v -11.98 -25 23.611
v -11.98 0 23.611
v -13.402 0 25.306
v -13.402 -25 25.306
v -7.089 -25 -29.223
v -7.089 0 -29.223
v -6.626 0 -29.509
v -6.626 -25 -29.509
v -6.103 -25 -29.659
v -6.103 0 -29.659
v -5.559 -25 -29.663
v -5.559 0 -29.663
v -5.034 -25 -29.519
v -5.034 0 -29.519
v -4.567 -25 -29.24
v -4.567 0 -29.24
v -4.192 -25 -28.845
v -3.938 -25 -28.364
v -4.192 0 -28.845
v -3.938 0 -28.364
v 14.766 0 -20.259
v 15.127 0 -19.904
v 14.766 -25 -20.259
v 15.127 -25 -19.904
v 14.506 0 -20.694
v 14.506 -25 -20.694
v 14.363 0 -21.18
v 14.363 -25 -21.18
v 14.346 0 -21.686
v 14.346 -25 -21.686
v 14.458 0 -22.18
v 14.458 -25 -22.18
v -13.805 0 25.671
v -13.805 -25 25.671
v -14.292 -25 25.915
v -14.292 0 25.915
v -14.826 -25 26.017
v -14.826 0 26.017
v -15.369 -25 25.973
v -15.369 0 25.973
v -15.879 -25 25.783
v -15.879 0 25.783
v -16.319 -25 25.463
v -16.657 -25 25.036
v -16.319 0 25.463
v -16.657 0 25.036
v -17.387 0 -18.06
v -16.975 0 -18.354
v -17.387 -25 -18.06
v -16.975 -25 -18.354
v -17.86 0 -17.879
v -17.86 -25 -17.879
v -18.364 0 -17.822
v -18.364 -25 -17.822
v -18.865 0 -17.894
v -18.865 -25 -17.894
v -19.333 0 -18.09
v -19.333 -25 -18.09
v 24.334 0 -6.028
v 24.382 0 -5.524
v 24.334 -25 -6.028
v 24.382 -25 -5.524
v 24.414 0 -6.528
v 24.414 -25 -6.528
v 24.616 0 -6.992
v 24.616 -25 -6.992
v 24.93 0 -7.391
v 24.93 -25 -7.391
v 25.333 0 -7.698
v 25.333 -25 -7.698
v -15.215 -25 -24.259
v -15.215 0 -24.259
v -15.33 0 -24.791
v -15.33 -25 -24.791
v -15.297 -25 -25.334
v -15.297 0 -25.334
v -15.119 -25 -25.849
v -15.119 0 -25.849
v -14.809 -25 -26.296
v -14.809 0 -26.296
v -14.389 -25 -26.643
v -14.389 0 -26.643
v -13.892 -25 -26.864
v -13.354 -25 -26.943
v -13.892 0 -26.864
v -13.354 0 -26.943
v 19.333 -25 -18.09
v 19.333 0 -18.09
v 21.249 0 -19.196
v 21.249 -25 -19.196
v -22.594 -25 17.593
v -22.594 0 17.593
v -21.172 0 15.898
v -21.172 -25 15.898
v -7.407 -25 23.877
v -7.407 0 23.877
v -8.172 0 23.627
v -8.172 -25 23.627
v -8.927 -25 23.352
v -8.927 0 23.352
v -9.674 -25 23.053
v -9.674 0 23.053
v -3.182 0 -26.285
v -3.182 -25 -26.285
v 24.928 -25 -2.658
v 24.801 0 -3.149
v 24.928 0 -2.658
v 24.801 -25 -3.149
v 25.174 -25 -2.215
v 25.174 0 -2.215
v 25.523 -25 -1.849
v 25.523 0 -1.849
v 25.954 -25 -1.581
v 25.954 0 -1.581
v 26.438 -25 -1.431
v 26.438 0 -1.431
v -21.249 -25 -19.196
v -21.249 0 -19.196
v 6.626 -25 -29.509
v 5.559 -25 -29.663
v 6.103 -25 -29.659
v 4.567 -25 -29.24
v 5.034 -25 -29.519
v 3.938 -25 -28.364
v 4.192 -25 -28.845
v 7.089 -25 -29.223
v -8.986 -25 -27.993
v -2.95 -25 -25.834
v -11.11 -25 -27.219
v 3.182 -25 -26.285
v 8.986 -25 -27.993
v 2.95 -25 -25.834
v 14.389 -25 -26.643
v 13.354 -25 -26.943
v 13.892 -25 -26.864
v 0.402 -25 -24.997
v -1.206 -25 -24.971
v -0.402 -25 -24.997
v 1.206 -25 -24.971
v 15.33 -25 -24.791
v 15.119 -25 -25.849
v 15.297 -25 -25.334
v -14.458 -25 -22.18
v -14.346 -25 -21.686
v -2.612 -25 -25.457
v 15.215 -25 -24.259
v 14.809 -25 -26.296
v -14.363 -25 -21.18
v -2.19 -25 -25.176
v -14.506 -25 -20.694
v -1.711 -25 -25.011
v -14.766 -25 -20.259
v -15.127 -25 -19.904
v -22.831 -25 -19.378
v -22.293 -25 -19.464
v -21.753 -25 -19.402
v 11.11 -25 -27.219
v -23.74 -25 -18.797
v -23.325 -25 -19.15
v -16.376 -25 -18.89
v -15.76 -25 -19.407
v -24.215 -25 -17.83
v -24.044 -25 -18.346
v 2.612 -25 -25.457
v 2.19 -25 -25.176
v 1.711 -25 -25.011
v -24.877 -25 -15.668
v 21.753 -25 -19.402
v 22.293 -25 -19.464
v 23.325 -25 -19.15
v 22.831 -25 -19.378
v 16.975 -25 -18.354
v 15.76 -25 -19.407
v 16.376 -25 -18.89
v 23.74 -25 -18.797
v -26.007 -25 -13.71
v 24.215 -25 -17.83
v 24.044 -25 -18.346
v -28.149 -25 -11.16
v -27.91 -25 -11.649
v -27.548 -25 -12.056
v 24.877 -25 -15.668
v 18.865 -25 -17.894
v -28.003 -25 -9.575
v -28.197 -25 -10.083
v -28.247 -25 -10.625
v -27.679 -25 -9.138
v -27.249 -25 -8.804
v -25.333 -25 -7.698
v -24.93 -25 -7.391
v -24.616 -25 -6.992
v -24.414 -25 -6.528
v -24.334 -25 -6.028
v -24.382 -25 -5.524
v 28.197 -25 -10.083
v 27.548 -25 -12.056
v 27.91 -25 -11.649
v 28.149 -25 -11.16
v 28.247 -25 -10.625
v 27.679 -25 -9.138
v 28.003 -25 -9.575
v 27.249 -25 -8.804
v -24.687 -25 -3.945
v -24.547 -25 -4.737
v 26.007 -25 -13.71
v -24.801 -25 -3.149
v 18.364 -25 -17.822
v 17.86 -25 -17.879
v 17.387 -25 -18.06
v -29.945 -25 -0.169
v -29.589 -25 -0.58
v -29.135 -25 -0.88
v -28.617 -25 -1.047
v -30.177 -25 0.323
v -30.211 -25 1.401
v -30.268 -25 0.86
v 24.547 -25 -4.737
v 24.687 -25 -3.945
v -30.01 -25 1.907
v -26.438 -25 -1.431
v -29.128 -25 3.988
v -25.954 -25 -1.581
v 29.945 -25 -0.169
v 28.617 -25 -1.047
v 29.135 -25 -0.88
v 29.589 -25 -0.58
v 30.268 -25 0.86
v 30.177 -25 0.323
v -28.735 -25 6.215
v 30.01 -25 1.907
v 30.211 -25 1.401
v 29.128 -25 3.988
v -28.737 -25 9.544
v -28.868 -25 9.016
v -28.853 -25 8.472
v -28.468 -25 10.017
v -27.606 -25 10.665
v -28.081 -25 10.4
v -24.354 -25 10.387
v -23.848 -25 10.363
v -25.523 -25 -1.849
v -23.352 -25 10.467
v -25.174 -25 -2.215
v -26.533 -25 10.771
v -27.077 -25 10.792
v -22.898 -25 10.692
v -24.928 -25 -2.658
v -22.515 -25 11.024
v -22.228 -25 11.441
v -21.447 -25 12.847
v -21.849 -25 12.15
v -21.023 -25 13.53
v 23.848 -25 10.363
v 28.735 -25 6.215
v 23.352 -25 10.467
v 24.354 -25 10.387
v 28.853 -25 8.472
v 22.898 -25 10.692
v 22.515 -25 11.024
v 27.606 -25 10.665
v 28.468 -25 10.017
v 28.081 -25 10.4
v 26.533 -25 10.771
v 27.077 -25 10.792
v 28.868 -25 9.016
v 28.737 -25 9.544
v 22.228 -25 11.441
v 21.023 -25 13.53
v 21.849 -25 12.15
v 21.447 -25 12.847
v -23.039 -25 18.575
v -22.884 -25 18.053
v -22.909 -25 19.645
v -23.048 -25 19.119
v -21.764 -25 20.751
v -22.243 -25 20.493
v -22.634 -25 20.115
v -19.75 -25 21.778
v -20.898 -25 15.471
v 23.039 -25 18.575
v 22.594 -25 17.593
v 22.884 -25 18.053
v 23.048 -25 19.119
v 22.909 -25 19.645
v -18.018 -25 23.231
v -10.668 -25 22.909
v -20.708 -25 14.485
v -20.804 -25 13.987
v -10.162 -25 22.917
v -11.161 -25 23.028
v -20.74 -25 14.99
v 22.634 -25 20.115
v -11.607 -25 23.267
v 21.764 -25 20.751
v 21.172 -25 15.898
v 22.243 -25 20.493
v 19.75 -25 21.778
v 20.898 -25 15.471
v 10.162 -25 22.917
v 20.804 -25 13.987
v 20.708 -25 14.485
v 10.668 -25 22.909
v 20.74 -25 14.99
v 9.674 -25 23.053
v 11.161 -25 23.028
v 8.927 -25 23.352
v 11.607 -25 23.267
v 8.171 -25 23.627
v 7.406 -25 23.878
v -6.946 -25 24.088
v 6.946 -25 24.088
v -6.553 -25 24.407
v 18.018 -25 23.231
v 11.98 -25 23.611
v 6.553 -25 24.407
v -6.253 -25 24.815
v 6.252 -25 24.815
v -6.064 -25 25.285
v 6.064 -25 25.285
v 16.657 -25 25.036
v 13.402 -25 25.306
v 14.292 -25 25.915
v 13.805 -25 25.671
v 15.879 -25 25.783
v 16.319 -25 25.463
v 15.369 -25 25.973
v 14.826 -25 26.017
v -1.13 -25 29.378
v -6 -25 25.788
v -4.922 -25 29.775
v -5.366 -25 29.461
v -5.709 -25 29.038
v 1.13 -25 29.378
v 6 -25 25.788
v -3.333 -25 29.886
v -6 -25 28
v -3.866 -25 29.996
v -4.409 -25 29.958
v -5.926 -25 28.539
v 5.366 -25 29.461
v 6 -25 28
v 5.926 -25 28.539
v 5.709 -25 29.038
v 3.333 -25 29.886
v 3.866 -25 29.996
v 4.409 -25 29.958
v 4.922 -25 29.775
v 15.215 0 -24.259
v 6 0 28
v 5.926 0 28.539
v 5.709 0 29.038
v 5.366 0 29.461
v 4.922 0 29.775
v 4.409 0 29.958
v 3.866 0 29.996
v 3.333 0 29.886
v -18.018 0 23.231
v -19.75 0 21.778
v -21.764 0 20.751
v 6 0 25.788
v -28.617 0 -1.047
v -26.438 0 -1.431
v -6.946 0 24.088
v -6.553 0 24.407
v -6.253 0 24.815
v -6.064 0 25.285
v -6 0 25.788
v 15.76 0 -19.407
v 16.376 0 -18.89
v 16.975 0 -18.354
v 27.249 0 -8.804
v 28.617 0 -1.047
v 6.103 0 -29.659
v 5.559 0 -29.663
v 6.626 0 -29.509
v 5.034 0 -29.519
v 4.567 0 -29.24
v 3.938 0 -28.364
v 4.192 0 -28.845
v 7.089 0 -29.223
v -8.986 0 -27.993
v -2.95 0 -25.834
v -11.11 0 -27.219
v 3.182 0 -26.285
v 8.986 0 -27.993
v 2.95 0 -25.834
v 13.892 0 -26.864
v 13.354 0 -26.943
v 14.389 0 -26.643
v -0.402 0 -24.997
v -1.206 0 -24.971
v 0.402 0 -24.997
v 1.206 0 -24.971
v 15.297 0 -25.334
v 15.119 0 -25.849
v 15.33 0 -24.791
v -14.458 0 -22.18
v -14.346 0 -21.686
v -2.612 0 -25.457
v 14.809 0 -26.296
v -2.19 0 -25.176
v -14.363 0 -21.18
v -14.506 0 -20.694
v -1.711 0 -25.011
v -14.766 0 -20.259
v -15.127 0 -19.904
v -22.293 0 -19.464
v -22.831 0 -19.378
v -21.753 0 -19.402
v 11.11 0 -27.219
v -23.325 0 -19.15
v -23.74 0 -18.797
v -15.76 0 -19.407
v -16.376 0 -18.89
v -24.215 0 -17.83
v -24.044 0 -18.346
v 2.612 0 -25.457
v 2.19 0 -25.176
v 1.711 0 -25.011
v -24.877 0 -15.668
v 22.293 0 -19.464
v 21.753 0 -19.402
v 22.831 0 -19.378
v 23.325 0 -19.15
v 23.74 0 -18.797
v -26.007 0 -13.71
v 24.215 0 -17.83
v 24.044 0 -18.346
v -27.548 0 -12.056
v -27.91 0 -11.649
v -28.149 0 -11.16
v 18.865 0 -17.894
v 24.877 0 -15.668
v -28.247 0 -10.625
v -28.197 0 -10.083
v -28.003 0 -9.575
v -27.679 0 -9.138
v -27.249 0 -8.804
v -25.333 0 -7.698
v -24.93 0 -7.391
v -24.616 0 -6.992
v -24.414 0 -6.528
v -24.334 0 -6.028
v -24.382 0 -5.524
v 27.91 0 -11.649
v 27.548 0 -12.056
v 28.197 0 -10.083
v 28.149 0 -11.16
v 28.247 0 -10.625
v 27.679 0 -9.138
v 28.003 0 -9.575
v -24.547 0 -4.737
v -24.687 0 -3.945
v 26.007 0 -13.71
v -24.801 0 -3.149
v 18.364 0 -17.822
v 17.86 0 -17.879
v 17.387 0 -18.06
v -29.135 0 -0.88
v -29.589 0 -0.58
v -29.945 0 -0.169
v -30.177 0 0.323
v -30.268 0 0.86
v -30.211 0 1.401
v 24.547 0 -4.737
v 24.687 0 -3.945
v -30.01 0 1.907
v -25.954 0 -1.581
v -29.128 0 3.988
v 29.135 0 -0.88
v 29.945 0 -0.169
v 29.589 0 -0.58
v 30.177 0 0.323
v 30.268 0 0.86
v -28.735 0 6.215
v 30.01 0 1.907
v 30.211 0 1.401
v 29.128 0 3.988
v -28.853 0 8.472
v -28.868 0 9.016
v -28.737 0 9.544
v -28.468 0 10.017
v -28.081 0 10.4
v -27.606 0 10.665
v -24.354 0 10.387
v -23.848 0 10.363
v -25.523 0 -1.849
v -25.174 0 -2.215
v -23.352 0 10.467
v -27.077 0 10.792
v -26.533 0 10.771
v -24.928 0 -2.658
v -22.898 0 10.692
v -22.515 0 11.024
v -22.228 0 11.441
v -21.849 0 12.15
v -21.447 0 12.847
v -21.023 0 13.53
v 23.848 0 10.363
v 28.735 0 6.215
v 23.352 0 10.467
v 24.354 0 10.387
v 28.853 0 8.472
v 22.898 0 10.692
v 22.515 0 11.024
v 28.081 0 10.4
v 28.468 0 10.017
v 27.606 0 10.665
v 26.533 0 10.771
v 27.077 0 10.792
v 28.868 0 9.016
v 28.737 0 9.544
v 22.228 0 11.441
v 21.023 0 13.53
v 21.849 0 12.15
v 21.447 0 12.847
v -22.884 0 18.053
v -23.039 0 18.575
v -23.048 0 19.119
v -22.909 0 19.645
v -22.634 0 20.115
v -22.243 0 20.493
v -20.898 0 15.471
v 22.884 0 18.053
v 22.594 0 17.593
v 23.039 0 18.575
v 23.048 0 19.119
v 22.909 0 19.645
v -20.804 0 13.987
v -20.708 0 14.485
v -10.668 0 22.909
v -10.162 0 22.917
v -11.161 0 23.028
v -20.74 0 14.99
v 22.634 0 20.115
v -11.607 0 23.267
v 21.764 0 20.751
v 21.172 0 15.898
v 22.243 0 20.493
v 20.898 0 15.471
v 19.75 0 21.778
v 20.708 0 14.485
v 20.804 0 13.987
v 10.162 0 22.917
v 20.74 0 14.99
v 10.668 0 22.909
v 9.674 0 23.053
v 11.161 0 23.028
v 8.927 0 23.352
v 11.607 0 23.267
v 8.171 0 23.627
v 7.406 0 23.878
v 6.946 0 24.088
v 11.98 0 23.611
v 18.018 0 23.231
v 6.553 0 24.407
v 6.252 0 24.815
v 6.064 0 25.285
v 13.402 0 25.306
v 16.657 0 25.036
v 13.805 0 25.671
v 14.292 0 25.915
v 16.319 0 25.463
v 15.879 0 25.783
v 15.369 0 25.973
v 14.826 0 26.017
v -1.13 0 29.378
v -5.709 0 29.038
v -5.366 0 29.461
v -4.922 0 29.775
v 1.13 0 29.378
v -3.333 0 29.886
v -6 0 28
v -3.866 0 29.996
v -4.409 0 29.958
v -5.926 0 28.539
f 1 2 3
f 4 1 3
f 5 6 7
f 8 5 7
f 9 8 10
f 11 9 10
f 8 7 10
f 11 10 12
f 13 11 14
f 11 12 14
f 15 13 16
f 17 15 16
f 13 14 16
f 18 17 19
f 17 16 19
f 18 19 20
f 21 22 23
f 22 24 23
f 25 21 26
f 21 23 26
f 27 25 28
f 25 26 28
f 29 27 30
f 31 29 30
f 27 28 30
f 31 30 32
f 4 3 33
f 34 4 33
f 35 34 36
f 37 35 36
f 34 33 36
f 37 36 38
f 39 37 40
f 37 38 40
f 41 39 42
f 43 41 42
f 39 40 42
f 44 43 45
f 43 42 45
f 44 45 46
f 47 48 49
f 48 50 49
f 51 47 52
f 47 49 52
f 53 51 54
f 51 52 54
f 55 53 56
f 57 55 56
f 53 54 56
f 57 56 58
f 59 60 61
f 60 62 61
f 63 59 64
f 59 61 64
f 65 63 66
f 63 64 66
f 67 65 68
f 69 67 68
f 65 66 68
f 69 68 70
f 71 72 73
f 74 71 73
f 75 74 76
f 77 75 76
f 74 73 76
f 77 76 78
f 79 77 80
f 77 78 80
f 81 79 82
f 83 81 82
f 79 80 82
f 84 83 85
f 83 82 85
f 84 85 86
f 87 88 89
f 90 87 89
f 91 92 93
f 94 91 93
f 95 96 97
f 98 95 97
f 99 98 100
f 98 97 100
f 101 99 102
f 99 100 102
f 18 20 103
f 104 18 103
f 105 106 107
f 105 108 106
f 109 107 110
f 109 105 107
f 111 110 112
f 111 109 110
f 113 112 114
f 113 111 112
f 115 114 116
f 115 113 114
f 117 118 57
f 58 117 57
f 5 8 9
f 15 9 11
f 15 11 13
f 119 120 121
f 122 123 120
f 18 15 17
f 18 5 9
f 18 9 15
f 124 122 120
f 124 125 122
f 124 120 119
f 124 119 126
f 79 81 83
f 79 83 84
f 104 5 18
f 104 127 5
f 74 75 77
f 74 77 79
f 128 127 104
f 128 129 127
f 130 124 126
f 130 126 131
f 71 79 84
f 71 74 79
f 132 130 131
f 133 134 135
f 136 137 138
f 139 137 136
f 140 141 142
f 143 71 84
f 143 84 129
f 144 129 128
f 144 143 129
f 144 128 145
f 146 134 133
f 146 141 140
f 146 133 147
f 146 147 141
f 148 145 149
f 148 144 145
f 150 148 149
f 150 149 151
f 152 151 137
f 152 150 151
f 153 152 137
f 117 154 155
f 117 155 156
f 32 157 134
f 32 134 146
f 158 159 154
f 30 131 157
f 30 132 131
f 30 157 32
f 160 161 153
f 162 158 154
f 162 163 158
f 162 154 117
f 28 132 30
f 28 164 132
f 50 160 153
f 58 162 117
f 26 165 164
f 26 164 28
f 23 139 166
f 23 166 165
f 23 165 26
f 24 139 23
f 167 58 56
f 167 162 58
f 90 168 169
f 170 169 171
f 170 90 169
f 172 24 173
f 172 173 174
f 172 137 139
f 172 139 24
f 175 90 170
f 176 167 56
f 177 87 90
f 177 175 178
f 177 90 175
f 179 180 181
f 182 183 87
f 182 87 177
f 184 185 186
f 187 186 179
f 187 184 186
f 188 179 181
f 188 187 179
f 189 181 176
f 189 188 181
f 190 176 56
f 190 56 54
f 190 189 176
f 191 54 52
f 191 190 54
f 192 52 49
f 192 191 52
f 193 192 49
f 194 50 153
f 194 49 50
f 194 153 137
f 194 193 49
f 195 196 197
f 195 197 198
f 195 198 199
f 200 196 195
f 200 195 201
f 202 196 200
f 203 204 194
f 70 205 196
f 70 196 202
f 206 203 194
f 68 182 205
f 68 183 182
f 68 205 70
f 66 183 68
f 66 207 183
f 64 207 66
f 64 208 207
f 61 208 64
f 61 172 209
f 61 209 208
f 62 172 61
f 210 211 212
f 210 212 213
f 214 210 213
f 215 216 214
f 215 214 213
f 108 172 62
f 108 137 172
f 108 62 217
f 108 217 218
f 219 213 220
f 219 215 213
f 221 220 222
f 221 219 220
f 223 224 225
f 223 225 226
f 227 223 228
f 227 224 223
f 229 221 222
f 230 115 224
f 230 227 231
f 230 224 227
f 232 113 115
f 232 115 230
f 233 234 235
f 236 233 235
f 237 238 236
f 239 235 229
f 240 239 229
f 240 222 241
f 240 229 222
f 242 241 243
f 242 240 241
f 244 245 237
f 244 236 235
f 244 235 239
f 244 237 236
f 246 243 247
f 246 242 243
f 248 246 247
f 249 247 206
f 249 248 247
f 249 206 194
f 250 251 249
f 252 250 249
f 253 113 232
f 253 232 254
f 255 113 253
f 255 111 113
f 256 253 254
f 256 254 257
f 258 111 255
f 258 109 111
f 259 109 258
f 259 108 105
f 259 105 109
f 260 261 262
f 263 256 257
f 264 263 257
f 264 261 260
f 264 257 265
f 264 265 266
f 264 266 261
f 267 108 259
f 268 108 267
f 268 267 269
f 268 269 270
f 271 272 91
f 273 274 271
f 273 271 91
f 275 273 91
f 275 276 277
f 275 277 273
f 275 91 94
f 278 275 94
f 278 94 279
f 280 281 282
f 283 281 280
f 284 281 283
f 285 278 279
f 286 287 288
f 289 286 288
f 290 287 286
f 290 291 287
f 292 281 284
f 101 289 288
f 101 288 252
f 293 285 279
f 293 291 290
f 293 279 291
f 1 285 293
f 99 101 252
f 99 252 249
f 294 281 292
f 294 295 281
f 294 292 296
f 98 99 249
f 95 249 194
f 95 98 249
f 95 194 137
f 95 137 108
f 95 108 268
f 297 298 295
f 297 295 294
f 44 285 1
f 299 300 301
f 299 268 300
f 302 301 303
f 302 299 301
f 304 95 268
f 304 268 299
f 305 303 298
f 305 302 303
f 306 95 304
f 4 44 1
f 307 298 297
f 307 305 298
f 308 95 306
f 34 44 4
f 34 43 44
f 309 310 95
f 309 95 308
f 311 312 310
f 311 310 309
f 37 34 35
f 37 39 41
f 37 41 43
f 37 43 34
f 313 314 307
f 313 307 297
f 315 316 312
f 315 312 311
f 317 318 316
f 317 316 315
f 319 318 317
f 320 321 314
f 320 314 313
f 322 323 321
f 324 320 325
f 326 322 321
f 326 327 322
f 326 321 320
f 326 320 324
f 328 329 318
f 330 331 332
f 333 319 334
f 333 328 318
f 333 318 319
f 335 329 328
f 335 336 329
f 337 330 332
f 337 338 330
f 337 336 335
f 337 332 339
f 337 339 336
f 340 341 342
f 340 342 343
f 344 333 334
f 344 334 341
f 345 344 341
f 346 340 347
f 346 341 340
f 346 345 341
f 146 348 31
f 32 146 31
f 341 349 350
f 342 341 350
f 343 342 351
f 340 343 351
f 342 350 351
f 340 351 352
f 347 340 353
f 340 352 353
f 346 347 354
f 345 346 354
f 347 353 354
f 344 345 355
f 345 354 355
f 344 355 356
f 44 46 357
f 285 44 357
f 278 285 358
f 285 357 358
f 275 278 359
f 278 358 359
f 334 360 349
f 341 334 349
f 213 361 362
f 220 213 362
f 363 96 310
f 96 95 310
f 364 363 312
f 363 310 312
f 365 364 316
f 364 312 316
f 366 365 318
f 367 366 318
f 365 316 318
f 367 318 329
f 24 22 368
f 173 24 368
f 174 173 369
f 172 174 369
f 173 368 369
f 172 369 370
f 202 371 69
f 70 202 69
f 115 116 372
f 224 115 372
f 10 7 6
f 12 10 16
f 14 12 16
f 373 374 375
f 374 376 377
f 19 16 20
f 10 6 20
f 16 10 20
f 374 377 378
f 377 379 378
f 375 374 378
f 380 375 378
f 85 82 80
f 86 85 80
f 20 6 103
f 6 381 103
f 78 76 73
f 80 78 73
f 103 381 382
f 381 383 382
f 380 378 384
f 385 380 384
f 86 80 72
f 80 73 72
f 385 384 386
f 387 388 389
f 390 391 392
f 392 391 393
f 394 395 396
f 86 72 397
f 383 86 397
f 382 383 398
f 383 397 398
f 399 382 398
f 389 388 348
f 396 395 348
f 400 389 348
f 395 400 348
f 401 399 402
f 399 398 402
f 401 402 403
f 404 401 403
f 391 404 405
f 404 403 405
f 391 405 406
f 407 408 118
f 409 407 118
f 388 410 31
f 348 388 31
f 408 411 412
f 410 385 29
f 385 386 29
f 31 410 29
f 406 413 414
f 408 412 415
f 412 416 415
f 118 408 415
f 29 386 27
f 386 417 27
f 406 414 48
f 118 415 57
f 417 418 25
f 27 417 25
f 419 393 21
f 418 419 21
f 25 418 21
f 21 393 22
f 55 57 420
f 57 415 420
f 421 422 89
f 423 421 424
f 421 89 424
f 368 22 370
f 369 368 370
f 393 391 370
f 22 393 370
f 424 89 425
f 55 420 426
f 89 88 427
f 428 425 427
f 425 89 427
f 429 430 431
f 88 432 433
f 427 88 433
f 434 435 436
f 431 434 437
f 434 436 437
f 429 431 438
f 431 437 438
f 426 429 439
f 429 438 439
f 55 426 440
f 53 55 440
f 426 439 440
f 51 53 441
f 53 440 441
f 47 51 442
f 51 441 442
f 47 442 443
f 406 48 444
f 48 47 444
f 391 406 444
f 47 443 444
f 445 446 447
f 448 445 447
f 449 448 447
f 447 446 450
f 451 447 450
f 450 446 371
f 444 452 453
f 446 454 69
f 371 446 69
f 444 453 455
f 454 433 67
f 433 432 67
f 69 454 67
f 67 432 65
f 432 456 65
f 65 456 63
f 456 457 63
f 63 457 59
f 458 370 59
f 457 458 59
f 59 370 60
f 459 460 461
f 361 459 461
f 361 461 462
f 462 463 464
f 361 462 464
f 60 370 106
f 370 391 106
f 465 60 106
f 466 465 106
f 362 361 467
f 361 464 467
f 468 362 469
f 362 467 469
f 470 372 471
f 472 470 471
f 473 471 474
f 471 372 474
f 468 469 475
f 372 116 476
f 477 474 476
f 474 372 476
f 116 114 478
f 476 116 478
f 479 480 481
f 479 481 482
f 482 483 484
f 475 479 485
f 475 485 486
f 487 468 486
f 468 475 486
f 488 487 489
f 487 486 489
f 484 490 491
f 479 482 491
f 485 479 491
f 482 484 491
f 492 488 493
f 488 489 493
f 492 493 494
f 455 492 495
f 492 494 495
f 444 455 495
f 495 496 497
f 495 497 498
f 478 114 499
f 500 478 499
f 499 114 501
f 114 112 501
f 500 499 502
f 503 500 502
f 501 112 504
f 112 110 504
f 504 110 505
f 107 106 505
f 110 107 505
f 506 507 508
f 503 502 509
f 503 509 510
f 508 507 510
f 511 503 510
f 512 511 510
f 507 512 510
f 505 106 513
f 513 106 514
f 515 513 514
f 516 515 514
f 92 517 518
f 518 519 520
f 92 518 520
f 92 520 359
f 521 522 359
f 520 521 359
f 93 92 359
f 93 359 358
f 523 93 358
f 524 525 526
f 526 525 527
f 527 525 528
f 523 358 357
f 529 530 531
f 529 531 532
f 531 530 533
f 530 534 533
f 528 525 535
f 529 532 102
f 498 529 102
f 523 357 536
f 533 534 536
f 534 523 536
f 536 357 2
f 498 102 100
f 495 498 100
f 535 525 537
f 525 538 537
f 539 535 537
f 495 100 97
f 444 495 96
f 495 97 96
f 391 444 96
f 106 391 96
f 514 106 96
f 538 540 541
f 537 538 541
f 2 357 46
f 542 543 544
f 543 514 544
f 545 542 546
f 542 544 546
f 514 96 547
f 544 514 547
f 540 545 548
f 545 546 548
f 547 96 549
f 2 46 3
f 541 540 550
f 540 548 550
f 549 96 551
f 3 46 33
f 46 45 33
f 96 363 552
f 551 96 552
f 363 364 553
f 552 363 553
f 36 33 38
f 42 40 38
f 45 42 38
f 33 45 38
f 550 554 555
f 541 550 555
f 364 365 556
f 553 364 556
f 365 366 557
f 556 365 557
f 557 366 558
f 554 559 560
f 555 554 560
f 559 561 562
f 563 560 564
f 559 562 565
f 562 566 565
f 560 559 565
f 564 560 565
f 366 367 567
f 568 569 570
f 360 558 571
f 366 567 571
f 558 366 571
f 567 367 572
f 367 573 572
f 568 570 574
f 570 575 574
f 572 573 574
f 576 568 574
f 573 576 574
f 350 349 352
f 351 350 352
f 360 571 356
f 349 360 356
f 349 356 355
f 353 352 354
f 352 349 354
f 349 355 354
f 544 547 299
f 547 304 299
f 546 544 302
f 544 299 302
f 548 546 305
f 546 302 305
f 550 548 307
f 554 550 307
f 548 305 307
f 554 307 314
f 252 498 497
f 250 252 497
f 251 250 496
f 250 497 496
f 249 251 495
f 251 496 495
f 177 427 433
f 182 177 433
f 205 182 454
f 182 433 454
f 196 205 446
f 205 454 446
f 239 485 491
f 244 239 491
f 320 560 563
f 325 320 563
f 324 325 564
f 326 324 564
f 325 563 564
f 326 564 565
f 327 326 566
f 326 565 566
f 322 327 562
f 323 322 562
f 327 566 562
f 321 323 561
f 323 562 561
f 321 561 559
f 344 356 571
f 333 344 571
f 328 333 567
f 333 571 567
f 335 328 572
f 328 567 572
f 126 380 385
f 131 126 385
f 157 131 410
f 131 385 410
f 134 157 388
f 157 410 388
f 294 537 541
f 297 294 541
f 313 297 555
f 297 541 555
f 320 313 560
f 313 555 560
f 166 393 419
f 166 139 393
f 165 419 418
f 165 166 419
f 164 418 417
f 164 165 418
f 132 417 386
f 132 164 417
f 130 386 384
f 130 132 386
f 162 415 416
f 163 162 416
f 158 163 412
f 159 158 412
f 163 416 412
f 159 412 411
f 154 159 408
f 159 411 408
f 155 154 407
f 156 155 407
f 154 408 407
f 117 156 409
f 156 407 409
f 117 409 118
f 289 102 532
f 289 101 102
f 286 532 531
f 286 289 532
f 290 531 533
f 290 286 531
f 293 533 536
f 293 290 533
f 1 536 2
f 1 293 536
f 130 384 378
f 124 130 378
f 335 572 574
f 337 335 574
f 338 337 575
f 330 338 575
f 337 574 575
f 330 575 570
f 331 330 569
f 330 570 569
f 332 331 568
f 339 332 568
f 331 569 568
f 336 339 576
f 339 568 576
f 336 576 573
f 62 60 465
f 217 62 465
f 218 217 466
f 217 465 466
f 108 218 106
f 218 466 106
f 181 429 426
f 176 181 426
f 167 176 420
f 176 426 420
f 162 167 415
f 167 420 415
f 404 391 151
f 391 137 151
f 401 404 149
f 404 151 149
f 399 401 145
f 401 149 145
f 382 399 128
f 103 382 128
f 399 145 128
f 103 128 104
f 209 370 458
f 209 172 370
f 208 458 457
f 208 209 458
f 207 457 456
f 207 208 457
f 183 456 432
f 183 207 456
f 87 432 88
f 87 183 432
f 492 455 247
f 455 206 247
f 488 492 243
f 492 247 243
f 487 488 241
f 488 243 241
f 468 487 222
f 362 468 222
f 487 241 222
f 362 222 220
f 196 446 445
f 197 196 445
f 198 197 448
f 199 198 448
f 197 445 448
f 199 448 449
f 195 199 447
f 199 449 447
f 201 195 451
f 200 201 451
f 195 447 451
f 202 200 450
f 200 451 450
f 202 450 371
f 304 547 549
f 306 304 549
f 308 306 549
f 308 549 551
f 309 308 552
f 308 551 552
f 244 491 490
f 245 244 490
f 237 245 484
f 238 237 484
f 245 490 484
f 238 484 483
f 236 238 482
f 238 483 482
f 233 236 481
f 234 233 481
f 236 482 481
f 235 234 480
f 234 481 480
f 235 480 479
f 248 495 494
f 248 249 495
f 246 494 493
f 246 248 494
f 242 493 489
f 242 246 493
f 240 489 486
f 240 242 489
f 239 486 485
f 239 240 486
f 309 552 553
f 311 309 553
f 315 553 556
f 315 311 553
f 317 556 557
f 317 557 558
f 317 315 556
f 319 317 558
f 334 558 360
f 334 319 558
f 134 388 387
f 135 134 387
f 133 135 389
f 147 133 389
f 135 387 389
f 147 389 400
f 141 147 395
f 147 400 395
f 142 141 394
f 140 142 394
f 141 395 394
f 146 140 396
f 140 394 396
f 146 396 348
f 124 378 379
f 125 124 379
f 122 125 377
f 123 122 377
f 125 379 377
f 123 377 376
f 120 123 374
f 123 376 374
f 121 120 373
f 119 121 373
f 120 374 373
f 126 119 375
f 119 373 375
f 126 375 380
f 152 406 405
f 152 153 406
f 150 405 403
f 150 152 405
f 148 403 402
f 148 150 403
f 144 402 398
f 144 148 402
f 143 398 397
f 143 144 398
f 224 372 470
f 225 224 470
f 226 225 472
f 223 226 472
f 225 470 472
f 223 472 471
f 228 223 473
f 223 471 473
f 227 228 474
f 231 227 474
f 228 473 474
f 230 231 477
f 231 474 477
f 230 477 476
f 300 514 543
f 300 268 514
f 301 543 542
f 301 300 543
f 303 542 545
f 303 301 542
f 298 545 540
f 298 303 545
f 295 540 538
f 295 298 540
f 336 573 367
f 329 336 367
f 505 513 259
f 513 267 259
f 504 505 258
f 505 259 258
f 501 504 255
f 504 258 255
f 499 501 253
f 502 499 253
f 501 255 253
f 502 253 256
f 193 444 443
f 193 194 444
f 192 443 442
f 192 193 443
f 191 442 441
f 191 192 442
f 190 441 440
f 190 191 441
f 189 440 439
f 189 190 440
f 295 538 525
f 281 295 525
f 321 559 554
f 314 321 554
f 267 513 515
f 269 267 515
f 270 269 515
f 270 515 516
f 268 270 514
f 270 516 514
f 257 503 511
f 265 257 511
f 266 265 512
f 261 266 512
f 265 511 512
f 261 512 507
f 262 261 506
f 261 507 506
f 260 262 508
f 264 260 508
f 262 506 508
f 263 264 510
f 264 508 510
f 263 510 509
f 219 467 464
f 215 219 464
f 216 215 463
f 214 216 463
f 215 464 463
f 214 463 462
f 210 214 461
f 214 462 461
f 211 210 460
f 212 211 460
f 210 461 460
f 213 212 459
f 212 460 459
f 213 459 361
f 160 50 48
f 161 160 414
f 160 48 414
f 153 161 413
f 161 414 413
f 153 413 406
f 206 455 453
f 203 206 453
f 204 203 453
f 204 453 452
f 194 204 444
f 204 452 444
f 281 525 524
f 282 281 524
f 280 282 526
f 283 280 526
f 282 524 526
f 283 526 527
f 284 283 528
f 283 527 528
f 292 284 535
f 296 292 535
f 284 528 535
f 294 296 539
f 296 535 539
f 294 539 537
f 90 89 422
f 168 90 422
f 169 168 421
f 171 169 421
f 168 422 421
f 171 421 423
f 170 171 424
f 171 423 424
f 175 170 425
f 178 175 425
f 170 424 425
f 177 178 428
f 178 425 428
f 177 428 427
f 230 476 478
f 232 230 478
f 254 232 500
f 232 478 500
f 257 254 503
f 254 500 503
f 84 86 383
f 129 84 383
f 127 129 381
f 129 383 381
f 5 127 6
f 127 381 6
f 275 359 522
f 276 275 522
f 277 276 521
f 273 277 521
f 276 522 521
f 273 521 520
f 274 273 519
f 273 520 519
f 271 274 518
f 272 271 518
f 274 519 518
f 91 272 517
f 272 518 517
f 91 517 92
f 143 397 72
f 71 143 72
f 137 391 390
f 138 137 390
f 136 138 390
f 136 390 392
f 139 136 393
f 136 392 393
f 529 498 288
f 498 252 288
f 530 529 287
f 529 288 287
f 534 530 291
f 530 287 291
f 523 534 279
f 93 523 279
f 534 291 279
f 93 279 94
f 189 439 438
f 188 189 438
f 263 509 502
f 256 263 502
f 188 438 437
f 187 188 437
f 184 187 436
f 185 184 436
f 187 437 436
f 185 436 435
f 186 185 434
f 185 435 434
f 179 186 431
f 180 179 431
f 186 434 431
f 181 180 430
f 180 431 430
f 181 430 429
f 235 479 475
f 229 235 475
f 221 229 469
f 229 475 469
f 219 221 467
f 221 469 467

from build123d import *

# Parameters (mm, degrees)
F1_DEPTH = 25
F2_R     = 2
F4_COUNT = 9


with BuildPart() as f1:
    # F0 (on Front) → F1 (new body)
    with BuildSketch(Plane.XZ):
        with BuildLine():
            ThreePointArc((-6, 24.269322), (-15.411035, -19.68502), (25, 0))
            ThreePointArc((25, 0), (19.68502, 15.411035), (6, 24.269322))
            ThreePointArc((6, 24.269322), (0, 25), (-6, 24.269322))
        make_face()
        with BuildLine():
            ThreePointArc((-6, 24.269322), (0, 25), (6, 24.269322))
            Line((6, 24.269322), (6, 28))
            ThreePointArc((6, 28), (5.154701, 29.632993), (3.333333, 29.885618))
            ThreePointArc((3.333333, 29.885618), (0, 29.313708), (-3.333333, 29.885618))
            ThreePointArc((-3.333333, 29.885618), (-5.154701, 29.632993), (-6, 28))
            Line((-6, 28), (-6, 24.269322))
        make_face()
    extrude(amount=F1_DEPTH)

    # F2
    f2_edges = [f1.edges().sort_by_distance(p)[0] for p in [
        (-6, -12.5, 24.269322),
        (6, -12.5, 24.269322),
    ]]
    fillet(f2_edges, radius=F2_R)

    # F4: F1 ×9 about axis
    f4_axis = Axis((0, -14.063225, 0), (0, -1, 0))


with BuildPart() as f1_1:
    add(f1.part)
    for i in range(1, F4_COUNT):
        add(f1.part.rotate(f4_axis, i * 360 / F4_COUNT))


solid = f1_1.part
